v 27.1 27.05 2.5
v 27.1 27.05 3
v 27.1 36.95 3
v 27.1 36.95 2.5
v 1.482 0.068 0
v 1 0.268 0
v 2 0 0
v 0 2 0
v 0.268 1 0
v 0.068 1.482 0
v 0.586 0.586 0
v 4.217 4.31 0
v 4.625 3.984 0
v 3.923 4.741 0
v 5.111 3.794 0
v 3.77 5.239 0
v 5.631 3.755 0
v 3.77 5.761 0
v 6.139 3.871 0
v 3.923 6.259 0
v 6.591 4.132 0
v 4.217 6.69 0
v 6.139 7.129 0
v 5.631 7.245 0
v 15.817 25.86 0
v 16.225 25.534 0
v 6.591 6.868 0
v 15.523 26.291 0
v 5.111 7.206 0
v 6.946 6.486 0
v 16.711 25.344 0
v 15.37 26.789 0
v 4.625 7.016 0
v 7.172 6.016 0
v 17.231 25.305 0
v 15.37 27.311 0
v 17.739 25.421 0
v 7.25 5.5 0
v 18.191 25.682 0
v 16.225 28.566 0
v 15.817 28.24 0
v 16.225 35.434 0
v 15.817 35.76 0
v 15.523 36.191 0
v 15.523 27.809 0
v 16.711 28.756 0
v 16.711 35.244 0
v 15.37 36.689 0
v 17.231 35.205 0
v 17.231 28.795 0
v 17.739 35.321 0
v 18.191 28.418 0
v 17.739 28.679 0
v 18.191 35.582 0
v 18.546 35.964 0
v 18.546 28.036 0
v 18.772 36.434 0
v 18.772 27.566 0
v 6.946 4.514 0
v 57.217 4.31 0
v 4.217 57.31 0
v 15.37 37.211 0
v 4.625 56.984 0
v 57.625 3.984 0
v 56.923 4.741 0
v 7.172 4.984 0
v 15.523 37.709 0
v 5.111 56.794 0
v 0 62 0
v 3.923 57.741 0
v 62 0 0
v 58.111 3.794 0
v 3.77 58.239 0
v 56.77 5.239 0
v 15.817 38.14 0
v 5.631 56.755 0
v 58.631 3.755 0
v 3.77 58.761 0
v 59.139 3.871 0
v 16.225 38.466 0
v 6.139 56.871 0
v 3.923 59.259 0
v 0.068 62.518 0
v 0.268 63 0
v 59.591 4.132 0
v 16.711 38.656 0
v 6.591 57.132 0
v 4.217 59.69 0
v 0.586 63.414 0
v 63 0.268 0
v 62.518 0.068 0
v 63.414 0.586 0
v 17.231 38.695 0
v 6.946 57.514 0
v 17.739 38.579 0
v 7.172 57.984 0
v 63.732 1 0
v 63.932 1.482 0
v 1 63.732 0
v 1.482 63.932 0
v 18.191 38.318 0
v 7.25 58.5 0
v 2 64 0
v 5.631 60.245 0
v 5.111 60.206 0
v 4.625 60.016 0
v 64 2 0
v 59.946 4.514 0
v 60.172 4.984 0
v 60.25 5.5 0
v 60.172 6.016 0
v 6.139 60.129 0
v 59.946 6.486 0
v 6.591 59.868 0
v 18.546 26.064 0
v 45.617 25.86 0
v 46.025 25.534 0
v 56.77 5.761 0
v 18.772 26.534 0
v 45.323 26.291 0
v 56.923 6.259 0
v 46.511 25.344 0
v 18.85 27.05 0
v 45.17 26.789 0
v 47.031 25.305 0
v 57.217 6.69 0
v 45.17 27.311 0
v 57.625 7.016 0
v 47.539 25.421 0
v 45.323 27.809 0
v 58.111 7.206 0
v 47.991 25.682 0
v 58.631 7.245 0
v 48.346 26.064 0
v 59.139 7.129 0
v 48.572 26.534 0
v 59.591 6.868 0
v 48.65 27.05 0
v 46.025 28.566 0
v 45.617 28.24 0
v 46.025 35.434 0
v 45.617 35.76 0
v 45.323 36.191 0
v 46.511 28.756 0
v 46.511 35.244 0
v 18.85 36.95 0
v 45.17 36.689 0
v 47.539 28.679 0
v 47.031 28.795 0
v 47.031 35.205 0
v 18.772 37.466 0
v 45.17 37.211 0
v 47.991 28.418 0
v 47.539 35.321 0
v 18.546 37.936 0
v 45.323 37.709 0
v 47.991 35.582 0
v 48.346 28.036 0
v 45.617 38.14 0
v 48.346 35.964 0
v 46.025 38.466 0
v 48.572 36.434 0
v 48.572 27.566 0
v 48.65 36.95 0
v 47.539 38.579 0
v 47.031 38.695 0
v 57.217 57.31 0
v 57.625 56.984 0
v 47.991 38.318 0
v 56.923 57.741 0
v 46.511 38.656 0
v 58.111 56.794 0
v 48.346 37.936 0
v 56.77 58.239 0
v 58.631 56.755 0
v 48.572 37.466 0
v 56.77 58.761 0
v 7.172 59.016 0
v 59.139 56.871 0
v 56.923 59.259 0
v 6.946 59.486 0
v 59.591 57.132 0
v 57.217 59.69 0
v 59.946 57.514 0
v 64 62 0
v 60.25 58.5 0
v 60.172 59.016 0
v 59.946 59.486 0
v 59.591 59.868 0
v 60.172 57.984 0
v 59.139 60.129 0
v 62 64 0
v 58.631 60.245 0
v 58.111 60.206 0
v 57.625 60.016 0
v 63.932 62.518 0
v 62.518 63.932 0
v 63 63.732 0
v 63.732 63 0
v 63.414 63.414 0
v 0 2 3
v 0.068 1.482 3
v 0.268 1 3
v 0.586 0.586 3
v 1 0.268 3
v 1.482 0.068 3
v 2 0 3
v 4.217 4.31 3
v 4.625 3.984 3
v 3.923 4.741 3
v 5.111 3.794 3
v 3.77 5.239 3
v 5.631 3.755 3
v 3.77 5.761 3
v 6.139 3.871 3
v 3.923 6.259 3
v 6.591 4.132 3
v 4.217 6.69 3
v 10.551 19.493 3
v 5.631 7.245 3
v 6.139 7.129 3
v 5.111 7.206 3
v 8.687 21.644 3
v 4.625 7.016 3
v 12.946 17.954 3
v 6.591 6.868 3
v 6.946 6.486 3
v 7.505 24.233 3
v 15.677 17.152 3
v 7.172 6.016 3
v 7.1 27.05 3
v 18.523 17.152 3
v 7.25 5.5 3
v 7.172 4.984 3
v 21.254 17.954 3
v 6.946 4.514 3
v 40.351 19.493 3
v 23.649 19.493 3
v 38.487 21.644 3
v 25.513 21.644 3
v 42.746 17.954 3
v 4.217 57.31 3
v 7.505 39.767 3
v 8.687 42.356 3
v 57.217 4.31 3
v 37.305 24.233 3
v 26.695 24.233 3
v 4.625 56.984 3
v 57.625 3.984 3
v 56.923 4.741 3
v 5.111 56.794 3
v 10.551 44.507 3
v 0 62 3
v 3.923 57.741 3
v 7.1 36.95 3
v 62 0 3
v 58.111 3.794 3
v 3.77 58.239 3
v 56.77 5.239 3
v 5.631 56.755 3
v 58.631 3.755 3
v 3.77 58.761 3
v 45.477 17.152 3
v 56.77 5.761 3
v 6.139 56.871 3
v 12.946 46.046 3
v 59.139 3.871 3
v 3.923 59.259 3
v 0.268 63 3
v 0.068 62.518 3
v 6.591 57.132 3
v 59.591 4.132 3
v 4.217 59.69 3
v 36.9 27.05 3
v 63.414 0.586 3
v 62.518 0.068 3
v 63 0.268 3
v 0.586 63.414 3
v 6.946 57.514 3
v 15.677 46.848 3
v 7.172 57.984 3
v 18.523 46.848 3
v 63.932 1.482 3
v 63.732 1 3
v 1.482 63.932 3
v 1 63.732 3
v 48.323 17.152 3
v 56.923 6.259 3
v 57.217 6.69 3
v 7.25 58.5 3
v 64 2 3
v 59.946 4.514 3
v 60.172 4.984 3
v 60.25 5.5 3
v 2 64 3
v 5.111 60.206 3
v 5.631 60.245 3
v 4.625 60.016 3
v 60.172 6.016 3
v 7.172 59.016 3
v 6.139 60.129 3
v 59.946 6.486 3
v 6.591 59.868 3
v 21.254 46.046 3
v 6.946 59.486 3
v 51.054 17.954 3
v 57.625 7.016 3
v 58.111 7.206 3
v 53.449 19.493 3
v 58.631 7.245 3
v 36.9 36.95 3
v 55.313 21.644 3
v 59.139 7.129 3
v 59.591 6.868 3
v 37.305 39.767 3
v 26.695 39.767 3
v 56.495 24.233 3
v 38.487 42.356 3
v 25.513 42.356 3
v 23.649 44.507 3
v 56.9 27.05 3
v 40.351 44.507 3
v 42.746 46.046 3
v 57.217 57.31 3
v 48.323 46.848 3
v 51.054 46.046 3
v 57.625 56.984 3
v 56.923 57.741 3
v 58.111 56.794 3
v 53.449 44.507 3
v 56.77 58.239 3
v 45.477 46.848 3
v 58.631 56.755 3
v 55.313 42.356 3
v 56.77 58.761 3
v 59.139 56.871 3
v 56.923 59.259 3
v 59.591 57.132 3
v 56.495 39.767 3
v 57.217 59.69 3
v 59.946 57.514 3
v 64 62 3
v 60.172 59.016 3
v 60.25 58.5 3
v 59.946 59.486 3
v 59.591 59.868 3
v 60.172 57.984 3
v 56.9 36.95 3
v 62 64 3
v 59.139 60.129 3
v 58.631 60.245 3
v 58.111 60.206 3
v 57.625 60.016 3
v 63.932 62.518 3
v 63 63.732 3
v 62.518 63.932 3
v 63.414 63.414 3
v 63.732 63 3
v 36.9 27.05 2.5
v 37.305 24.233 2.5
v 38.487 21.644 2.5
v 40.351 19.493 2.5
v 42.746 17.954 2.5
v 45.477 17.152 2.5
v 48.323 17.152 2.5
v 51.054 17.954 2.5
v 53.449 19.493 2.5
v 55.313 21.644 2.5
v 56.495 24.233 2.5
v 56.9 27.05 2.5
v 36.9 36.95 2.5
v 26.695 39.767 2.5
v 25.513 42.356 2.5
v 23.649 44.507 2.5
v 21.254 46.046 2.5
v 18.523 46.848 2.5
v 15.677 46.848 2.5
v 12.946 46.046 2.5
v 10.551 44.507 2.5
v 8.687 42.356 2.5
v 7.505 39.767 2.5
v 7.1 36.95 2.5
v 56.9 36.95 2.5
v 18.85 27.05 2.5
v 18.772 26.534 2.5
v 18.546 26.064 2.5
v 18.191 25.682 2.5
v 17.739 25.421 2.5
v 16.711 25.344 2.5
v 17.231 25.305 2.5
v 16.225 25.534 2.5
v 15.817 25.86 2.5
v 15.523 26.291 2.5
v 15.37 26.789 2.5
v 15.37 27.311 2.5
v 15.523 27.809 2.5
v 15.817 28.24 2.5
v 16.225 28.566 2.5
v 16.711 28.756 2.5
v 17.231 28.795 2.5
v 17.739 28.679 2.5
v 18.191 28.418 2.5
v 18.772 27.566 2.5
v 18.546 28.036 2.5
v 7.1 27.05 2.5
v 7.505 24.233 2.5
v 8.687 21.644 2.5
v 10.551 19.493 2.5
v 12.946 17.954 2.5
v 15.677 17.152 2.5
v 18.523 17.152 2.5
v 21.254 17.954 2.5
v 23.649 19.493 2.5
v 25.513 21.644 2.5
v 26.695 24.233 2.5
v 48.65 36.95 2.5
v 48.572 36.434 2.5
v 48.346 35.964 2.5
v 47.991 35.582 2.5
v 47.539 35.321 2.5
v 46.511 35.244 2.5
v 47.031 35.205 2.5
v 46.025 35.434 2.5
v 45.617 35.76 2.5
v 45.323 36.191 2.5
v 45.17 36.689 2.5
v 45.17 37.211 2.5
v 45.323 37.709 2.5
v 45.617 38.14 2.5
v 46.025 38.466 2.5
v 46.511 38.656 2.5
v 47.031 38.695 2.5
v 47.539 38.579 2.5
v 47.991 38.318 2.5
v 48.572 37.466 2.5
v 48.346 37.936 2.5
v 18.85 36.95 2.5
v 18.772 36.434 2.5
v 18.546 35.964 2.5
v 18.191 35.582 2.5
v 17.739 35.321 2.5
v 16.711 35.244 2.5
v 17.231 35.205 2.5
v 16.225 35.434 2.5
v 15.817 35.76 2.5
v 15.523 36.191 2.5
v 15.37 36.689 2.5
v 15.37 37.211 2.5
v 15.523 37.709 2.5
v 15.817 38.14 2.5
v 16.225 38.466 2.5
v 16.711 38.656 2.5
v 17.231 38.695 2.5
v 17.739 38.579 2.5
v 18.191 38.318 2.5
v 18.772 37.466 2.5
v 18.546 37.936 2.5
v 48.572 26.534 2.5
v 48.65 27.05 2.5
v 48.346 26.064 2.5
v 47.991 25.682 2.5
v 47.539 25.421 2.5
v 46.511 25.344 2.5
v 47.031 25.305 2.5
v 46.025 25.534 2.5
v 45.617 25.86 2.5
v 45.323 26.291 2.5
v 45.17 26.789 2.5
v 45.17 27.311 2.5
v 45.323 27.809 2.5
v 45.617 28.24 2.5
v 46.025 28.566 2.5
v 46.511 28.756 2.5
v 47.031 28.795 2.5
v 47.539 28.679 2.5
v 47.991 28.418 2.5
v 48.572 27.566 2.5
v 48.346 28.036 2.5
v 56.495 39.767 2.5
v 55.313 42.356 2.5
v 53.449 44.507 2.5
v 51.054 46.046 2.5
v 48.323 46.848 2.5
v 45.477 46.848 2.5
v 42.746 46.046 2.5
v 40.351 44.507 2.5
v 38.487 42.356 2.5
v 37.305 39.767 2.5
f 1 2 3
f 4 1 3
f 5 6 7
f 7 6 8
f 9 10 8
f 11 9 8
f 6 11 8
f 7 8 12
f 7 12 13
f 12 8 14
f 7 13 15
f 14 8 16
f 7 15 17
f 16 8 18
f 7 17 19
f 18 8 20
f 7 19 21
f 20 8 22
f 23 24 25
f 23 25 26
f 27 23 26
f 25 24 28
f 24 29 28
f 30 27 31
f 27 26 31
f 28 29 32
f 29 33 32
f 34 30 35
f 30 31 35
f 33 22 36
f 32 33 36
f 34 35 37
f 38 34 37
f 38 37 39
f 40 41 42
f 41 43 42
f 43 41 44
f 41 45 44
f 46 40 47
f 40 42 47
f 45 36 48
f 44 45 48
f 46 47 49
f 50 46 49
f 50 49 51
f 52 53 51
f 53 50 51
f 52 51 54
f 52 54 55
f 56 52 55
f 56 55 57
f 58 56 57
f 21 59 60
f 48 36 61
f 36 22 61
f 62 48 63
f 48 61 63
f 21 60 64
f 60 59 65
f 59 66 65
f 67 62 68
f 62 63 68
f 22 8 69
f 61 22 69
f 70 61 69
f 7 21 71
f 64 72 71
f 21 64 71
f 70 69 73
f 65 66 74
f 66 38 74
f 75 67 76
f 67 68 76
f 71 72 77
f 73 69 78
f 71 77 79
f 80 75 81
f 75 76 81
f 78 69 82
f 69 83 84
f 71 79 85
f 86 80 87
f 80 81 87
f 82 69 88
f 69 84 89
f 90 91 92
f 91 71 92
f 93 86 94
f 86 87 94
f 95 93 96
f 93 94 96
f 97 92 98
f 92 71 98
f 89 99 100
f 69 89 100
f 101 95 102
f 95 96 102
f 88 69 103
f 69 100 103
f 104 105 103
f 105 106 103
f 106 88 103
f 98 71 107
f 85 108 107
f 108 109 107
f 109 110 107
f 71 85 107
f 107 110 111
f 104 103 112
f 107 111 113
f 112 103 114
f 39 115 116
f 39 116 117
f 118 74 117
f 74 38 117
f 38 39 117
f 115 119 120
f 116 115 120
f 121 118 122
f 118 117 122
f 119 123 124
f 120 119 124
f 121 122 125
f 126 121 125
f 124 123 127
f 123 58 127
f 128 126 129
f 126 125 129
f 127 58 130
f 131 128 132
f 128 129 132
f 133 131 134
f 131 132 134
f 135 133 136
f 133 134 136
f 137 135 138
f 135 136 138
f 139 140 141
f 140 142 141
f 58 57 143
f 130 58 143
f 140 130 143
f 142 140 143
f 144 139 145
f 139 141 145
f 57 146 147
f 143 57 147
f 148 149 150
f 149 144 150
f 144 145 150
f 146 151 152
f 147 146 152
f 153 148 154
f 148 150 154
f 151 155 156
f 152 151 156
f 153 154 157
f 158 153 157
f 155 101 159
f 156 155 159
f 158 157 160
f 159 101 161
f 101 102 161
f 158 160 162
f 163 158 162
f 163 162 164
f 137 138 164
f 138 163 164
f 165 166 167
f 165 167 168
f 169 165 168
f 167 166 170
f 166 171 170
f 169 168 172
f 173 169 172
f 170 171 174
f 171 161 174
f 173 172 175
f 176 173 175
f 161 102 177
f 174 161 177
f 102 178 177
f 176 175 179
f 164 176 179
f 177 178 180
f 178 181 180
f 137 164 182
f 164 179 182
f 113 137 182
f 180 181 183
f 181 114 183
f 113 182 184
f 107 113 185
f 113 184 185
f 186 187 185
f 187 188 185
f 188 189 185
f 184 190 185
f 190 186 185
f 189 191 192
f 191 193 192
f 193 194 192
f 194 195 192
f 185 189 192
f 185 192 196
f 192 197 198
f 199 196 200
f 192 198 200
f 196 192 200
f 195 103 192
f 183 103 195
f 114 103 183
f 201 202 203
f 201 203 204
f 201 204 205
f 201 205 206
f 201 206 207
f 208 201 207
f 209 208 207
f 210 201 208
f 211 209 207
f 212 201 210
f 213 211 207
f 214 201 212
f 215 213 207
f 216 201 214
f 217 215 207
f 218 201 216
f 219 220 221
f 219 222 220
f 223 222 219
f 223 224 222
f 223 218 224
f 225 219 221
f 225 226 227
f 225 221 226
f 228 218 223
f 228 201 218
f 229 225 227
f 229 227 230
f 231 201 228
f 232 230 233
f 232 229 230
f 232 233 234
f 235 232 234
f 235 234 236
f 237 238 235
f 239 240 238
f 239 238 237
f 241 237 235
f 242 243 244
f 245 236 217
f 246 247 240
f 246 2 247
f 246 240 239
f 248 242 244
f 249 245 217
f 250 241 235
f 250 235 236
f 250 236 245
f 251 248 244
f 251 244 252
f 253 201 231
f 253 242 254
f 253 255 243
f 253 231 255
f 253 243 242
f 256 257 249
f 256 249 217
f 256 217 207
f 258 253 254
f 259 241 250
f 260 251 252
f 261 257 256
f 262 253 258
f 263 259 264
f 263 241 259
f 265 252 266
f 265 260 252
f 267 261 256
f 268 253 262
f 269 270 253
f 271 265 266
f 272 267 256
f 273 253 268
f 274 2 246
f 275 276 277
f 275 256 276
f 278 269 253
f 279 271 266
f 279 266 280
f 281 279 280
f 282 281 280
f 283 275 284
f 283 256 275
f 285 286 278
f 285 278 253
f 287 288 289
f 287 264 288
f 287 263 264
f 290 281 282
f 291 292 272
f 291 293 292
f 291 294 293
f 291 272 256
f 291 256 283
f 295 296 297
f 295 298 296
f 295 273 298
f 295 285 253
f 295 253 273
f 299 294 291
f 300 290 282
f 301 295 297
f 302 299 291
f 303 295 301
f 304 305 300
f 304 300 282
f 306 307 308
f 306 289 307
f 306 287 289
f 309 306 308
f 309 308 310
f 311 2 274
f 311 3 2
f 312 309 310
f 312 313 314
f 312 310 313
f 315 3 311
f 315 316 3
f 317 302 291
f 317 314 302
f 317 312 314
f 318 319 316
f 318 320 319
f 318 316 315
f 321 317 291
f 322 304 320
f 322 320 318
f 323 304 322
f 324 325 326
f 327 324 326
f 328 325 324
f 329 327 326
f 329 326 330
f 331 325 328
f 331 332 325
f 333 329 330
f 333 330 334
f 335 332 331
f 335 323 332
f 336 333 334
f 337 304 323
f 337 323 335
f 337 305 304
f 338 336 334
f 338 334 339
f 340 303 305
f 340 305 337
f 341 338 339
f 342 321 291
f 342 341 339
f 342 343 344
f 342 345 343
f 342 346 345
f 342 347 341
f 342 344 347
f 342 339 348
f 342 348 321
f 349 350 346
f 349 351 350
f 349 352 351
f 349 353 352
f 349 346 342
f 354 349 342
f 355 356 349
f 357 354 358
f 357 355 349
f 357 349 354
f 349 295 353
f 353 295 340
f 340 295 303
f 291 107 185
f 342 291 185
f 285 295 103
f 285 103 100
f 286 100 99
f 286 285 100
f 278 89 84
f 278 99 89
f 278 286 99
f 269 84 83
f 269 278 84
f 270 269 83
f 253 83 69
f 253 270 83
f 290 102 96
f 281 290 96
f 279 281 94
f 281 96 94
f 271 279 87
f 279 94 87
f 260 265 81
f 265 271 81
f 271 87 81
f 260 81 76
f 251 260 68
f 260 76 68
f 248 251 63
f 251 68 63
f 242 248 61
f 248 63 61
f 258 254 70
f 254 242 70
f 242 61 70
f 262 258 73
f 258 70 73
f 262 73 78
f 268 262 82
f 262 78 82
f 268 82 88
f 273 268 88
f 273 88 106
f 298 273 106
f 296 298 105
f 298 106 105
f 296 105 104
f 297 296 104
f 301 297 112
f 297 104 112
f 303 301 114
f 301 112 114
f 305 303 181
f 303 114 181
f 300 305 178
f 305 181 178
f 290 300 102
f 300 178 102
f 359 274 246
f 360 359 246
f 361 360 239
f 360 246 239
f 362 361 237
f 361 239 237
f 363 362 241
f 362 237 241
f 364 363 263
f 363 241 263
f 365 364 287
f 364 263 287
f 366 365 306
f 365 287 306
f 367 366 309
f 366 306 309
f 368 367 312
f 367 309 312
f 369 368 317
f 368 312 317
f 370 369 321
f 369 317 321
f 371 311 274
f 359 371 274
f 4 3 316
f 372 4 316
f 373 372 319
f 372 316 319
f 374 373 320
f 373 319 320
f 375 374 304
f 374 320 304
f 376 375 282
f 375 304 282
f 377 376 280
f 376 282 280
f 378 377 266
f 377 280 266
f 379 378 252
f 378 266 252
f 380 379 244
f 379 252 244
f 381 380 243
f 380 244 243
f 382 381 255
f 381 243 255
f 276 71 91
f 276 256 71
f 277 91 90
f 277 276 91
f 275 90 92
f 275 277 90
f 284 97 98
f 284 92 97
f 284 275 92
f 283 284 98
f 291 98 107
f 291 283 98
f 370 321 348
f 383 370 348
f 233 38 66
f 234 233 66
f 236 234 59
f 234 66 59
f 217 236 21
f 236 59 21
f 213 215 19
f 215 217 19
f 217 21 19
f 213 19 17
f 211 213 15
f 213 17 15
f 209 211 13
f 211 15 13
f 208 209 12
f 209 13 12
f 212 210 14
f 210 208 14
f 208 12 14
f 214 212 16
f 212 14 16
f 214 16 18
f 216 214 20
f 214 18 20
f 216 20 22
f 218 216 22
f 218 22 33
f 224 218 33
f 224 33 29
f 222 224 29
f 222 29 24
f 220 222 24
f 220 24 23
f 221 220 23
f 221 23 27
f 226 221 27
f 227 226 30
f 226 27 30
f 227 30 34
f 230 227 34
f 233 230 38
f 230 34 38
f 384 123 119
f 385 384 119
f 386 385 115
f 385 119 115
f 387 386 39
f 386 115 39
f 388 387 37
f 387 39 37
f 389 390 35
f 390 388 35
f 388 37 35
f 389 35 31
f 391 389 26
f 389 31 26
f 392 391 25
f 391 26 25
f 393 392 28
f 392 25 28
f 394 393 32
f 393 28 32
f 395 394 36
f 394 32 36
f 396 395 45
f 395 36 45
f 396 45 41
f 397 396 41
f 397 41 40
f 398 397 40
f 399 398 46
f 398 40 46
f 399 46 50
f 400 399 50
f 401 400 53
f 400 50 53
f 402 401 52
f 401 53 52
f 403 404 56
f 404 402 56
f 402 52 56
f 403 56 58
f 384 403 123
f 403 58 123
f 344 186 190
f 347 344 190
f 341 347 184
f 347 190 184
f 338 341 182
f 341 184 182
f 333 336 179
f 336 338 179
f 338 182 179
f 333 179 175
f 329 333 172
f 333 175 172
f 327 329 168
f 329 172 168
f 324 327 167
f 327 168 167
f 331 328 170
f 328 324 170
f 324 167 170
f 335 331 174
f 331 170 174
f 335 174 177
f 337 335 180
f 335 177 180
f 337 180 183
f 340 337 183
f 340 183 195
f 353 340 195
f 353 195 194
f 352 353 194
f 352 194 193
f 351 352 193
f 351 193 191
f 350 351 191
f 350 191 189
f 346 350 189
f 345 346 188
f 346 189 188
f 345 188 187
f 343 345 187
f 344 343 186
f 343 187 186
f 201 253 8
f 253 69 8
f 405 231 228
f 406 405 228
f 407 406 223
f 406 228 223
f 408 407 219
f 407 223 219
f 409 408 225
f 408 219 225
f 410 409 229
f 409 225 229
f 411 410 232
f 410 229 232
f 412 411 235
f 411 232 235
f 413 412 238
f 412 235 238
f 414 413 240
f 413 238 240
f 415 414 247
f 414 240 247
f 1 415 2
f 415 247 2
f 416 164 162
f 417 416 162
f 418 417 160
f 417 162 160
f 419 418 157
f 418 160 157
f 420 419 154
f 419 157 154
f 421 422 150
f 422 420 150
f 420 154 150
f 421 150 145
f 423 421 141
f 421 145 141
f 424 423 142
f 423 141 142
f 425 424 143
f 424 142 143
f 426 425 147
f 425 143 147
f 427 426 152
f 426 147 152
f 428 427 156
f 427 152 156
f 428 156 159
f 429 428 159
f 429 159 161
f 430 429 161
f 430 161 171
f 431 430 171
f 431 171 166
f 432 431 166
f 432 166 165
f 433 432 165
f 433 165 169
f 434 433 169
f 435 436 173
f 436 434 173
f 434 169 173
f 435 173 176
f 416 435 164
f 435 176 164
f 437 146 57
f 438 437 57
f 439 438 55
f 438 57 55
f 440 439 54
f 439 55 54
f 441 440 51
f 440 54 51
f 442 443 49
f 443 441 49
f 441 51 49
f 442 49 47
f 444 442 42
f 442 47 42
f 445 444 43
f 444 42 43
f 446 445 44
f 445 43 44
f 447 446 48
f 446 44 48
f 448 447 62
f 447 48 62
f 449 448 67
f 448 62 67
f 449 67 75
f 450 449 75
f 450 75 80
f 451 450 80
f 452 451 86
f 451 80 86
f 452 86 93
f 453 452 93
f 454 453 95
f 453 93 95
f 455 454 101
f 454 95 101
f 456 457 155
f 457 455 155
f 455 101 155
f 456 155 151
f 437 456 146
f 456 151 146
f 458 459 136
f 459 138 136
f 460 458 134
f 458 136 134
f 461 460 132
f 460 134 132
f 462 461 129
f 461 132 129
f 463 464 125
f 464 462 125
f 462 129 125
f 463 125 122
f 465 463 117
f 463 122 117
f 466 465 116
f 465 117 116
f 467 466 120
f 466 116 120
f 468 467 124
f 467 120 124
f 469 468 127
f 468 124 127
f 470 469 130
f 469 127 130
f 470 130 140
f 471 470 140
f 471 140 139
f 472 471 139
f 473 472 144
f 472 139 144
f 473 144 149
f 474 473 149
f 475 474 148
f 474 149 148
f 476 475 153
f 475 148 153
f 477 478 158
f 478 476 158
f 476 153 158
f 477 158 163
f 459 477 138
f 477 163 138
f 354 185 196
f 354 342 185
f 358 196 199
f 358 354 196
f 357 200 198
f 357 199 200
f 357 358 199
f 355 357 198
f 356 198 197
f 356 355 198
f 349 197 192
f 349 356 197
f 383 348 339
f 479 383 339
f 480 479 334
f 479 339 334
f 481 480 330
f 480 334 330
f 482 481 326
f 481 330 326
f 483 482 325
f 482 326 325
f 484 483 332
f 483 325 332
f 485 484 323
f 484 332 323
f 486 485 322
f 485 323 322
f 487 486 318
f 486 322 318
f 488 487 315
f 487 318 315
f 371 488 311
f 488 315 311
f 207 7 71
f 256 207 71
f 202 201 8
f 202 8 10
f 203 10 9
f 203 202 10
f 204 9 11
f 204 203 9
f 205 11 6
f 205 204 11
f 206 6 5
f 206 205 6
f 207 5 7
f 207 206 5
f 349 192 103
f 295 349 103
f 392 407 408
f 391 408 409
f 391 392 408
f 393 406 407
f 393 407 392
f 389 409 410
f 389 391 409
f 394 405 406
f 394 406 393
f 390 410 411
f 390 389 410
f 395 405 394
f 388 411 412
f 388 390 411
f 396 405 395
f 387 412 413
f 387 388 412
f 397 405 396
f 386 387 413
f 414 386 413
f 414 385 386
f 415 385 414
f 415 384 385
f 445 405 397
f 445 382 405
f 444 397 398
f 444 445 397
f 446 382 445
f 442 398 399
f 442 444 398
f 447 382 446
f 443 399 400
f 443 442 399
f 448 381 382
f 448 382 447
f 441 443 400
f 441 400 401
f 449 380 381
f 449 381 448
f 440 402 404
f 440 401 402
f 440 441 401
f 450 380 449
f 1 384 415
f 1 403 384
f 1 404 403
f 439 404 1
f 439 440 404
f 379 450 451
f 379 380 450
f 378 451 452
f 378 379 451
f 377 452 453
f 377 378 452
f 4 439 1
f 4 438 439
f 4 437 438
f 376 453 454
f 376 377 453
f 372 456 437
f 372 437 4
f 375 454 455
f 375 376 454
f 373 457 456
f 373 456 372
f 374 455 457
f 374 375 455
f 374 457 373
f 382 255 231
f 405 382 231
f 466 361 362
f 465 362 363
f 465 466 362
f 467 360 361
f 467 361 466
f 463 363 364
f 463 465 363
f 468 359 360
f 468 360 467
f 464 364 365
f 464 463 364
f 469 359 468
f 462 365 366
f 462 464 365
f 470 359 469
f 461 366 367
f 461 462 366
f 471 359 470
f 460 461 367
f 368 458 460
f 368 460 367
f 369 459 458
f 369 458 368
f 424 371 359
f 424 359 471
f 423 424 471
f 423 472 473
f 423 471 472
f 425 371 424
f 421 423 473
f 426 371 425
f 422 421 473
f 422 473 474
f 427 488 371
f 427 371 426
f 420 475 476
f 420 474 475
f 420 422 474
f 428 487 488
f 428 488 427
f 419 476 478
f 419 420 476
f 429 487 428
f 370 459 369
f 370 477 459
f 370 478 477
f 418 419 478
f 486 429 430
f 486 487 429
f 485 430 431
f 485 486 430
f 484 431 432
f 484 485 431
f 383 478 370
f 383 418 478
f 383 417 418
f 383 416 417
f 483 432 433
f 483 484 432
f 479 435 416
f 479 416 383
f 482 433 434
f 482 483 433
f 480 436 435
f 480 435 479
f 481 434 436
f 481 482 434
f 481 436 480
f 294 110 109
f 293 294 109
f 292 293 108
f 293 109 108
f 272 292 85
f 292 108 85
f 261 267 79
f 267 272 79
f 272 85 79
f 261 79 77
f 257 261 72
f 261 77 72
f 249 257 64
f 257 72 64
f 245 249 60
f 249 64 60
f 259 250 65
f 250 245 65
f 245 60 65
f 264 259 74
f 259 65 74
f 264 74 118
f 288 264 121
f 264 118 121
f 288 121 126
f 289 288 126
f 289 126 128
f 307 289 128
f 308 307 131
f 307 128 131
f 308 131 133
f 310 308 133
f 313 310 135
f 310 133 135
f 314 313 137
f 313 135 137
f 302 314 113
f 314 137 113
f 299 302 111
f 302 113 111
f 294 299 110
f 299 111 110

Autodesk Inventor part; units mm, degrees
ref_plane "YZ Plane" through (0, 0, 0) normal (1, 0, 0) x (0, 1, 0)
ref_plane "XZ Plane" through (0, 0, 0) normal (0, 1, 0) x (-1, 0, 0)
ref_plane "XY Plane" through (0, 0, 0) normal (0, 0, 1) x (1, 0, 0)
sketch "スケッチ1" plane through (0, 0, 0) normal (0, 0, 1) x (1, 0, 0)
  line L0 (0, 0) -> (64, 0)
  line L1 (64, 0) -> (64, 64)
  line L2 (64, 64) -> (0, 64)
  line L3 (0, 64) -> (0, 0)
  line L4 (5.5, 58.5) -> (58.5, 58.5) construction
  line L5 (58.5, 58.5) -> (58.5, 5.5) construction
  line L6 (58.5, 5.5) -> (5.5, 5.5) construction
  line L7 (5.5, 5.5) -> (5.5, 58.5) construction
  circle A0 centre (5.5, 58.5) radius 1.75
  circle A1 centre (5.5, 5.5) radius 1.75
  circle A2 centre (58.5, 5.5) radius 1.75
  circle A3 centre (58.5, 58.5) radius 1.75
  line L8 (0, 32) -> (64, 32) construction
  line L9 (32, 64) -> (32, 0) construction
  line L10 (17.1, 27.05) -> (46.9, 27.05) construction
  line L11 (46.9, 27.05) -> (46.9, 36.95) construction
  line L12 (46.9, 36.95) -> (17.1, 36.95) construction
  line L13 (17.1, 36.95) -> (17.1, 27.05) construction
  line L14 (17.1, 27.05) -> (46.9, 36.95) construction
  line L15 (46.9, 27.05) -> (17.1, 36.95) construction
  circle A4 centre (46.9, 36.95) radius 1.75
  circle A5 centre (46.9, 27.05) radius 1.75
  circle A6 centre (17.1, 27.05) radius 1.75
  circle A7 centre (17.1, 36.95) radius 1.75
  point P0 (32, 32)
  dimension "d0" = 64
  dimension "d2" = 53
  dimension "d3" = 3.5
  dimension "d4" = 3.5
  dimension "d5" = 9.9
  dimension "d6" = 29.8
extrude "押し出し1" add sketch "スケッチ1" along normal blind 3
fillet "フィレット1" radius 2 4 edges at (0, 0, 1.5) (64, 0, 1.5) (64, 64, 1.5) (0, 64, 1.5)
sketch "スケッチ2" plane through (0, 0, 3) normal (0, 0, 1) x (1, 0, 0)
  circle A0 centre (17.1, 36.95) radius 1.75 projected
  circle A1 centre (17.1, 27.05) radius 1.75 projected
  line L0 (17.1, 36.95) -> (17.1, 27.05) construction
  line L1 (7.1, 36.95) -> (7.1, 27.05)
  line L2 (27.1, 27.05) -> (27.1, 36.95)
  arc A2 (27.1, 36.95) -> (7.1, 36.95) centre (17.1, 36.95) ccw
  arc A3 (7.1, 27.05) -> (27.1, 27.05) centre (17.1, 27.05) ccw
  circle A4 centre (46.9, 36.95) radius 1.75 projected
  circle A5 centre (46.9, 27.05) radius 1.75 projected
  line L3 (46.9, 36.95) -> (46.9, 27.05) construction
  line L4 (36.9, 36.95) -> (36.9, 27.05)
  line L5 (56.9, 27.05) -> (56.9, 36.95)
  arc A6 (56.9, 36.95) -> (36.9, 36.95) centre (46.9, 36.95) ccw
  arc A7 (36.9, 27.05) -> (56.9, 27.05) centre (46.9, 27.05) ccw
  point P0 (0, 0)
  point P1 (17.1, 32)
  point P2 (46.9, 32)
  dimension "d10" = 10
  dimension "d11" = 10
extrude "押し出し2" cut sketch "スケッチ2" against normal blind 0.5
properties part number "_3D プリント"
